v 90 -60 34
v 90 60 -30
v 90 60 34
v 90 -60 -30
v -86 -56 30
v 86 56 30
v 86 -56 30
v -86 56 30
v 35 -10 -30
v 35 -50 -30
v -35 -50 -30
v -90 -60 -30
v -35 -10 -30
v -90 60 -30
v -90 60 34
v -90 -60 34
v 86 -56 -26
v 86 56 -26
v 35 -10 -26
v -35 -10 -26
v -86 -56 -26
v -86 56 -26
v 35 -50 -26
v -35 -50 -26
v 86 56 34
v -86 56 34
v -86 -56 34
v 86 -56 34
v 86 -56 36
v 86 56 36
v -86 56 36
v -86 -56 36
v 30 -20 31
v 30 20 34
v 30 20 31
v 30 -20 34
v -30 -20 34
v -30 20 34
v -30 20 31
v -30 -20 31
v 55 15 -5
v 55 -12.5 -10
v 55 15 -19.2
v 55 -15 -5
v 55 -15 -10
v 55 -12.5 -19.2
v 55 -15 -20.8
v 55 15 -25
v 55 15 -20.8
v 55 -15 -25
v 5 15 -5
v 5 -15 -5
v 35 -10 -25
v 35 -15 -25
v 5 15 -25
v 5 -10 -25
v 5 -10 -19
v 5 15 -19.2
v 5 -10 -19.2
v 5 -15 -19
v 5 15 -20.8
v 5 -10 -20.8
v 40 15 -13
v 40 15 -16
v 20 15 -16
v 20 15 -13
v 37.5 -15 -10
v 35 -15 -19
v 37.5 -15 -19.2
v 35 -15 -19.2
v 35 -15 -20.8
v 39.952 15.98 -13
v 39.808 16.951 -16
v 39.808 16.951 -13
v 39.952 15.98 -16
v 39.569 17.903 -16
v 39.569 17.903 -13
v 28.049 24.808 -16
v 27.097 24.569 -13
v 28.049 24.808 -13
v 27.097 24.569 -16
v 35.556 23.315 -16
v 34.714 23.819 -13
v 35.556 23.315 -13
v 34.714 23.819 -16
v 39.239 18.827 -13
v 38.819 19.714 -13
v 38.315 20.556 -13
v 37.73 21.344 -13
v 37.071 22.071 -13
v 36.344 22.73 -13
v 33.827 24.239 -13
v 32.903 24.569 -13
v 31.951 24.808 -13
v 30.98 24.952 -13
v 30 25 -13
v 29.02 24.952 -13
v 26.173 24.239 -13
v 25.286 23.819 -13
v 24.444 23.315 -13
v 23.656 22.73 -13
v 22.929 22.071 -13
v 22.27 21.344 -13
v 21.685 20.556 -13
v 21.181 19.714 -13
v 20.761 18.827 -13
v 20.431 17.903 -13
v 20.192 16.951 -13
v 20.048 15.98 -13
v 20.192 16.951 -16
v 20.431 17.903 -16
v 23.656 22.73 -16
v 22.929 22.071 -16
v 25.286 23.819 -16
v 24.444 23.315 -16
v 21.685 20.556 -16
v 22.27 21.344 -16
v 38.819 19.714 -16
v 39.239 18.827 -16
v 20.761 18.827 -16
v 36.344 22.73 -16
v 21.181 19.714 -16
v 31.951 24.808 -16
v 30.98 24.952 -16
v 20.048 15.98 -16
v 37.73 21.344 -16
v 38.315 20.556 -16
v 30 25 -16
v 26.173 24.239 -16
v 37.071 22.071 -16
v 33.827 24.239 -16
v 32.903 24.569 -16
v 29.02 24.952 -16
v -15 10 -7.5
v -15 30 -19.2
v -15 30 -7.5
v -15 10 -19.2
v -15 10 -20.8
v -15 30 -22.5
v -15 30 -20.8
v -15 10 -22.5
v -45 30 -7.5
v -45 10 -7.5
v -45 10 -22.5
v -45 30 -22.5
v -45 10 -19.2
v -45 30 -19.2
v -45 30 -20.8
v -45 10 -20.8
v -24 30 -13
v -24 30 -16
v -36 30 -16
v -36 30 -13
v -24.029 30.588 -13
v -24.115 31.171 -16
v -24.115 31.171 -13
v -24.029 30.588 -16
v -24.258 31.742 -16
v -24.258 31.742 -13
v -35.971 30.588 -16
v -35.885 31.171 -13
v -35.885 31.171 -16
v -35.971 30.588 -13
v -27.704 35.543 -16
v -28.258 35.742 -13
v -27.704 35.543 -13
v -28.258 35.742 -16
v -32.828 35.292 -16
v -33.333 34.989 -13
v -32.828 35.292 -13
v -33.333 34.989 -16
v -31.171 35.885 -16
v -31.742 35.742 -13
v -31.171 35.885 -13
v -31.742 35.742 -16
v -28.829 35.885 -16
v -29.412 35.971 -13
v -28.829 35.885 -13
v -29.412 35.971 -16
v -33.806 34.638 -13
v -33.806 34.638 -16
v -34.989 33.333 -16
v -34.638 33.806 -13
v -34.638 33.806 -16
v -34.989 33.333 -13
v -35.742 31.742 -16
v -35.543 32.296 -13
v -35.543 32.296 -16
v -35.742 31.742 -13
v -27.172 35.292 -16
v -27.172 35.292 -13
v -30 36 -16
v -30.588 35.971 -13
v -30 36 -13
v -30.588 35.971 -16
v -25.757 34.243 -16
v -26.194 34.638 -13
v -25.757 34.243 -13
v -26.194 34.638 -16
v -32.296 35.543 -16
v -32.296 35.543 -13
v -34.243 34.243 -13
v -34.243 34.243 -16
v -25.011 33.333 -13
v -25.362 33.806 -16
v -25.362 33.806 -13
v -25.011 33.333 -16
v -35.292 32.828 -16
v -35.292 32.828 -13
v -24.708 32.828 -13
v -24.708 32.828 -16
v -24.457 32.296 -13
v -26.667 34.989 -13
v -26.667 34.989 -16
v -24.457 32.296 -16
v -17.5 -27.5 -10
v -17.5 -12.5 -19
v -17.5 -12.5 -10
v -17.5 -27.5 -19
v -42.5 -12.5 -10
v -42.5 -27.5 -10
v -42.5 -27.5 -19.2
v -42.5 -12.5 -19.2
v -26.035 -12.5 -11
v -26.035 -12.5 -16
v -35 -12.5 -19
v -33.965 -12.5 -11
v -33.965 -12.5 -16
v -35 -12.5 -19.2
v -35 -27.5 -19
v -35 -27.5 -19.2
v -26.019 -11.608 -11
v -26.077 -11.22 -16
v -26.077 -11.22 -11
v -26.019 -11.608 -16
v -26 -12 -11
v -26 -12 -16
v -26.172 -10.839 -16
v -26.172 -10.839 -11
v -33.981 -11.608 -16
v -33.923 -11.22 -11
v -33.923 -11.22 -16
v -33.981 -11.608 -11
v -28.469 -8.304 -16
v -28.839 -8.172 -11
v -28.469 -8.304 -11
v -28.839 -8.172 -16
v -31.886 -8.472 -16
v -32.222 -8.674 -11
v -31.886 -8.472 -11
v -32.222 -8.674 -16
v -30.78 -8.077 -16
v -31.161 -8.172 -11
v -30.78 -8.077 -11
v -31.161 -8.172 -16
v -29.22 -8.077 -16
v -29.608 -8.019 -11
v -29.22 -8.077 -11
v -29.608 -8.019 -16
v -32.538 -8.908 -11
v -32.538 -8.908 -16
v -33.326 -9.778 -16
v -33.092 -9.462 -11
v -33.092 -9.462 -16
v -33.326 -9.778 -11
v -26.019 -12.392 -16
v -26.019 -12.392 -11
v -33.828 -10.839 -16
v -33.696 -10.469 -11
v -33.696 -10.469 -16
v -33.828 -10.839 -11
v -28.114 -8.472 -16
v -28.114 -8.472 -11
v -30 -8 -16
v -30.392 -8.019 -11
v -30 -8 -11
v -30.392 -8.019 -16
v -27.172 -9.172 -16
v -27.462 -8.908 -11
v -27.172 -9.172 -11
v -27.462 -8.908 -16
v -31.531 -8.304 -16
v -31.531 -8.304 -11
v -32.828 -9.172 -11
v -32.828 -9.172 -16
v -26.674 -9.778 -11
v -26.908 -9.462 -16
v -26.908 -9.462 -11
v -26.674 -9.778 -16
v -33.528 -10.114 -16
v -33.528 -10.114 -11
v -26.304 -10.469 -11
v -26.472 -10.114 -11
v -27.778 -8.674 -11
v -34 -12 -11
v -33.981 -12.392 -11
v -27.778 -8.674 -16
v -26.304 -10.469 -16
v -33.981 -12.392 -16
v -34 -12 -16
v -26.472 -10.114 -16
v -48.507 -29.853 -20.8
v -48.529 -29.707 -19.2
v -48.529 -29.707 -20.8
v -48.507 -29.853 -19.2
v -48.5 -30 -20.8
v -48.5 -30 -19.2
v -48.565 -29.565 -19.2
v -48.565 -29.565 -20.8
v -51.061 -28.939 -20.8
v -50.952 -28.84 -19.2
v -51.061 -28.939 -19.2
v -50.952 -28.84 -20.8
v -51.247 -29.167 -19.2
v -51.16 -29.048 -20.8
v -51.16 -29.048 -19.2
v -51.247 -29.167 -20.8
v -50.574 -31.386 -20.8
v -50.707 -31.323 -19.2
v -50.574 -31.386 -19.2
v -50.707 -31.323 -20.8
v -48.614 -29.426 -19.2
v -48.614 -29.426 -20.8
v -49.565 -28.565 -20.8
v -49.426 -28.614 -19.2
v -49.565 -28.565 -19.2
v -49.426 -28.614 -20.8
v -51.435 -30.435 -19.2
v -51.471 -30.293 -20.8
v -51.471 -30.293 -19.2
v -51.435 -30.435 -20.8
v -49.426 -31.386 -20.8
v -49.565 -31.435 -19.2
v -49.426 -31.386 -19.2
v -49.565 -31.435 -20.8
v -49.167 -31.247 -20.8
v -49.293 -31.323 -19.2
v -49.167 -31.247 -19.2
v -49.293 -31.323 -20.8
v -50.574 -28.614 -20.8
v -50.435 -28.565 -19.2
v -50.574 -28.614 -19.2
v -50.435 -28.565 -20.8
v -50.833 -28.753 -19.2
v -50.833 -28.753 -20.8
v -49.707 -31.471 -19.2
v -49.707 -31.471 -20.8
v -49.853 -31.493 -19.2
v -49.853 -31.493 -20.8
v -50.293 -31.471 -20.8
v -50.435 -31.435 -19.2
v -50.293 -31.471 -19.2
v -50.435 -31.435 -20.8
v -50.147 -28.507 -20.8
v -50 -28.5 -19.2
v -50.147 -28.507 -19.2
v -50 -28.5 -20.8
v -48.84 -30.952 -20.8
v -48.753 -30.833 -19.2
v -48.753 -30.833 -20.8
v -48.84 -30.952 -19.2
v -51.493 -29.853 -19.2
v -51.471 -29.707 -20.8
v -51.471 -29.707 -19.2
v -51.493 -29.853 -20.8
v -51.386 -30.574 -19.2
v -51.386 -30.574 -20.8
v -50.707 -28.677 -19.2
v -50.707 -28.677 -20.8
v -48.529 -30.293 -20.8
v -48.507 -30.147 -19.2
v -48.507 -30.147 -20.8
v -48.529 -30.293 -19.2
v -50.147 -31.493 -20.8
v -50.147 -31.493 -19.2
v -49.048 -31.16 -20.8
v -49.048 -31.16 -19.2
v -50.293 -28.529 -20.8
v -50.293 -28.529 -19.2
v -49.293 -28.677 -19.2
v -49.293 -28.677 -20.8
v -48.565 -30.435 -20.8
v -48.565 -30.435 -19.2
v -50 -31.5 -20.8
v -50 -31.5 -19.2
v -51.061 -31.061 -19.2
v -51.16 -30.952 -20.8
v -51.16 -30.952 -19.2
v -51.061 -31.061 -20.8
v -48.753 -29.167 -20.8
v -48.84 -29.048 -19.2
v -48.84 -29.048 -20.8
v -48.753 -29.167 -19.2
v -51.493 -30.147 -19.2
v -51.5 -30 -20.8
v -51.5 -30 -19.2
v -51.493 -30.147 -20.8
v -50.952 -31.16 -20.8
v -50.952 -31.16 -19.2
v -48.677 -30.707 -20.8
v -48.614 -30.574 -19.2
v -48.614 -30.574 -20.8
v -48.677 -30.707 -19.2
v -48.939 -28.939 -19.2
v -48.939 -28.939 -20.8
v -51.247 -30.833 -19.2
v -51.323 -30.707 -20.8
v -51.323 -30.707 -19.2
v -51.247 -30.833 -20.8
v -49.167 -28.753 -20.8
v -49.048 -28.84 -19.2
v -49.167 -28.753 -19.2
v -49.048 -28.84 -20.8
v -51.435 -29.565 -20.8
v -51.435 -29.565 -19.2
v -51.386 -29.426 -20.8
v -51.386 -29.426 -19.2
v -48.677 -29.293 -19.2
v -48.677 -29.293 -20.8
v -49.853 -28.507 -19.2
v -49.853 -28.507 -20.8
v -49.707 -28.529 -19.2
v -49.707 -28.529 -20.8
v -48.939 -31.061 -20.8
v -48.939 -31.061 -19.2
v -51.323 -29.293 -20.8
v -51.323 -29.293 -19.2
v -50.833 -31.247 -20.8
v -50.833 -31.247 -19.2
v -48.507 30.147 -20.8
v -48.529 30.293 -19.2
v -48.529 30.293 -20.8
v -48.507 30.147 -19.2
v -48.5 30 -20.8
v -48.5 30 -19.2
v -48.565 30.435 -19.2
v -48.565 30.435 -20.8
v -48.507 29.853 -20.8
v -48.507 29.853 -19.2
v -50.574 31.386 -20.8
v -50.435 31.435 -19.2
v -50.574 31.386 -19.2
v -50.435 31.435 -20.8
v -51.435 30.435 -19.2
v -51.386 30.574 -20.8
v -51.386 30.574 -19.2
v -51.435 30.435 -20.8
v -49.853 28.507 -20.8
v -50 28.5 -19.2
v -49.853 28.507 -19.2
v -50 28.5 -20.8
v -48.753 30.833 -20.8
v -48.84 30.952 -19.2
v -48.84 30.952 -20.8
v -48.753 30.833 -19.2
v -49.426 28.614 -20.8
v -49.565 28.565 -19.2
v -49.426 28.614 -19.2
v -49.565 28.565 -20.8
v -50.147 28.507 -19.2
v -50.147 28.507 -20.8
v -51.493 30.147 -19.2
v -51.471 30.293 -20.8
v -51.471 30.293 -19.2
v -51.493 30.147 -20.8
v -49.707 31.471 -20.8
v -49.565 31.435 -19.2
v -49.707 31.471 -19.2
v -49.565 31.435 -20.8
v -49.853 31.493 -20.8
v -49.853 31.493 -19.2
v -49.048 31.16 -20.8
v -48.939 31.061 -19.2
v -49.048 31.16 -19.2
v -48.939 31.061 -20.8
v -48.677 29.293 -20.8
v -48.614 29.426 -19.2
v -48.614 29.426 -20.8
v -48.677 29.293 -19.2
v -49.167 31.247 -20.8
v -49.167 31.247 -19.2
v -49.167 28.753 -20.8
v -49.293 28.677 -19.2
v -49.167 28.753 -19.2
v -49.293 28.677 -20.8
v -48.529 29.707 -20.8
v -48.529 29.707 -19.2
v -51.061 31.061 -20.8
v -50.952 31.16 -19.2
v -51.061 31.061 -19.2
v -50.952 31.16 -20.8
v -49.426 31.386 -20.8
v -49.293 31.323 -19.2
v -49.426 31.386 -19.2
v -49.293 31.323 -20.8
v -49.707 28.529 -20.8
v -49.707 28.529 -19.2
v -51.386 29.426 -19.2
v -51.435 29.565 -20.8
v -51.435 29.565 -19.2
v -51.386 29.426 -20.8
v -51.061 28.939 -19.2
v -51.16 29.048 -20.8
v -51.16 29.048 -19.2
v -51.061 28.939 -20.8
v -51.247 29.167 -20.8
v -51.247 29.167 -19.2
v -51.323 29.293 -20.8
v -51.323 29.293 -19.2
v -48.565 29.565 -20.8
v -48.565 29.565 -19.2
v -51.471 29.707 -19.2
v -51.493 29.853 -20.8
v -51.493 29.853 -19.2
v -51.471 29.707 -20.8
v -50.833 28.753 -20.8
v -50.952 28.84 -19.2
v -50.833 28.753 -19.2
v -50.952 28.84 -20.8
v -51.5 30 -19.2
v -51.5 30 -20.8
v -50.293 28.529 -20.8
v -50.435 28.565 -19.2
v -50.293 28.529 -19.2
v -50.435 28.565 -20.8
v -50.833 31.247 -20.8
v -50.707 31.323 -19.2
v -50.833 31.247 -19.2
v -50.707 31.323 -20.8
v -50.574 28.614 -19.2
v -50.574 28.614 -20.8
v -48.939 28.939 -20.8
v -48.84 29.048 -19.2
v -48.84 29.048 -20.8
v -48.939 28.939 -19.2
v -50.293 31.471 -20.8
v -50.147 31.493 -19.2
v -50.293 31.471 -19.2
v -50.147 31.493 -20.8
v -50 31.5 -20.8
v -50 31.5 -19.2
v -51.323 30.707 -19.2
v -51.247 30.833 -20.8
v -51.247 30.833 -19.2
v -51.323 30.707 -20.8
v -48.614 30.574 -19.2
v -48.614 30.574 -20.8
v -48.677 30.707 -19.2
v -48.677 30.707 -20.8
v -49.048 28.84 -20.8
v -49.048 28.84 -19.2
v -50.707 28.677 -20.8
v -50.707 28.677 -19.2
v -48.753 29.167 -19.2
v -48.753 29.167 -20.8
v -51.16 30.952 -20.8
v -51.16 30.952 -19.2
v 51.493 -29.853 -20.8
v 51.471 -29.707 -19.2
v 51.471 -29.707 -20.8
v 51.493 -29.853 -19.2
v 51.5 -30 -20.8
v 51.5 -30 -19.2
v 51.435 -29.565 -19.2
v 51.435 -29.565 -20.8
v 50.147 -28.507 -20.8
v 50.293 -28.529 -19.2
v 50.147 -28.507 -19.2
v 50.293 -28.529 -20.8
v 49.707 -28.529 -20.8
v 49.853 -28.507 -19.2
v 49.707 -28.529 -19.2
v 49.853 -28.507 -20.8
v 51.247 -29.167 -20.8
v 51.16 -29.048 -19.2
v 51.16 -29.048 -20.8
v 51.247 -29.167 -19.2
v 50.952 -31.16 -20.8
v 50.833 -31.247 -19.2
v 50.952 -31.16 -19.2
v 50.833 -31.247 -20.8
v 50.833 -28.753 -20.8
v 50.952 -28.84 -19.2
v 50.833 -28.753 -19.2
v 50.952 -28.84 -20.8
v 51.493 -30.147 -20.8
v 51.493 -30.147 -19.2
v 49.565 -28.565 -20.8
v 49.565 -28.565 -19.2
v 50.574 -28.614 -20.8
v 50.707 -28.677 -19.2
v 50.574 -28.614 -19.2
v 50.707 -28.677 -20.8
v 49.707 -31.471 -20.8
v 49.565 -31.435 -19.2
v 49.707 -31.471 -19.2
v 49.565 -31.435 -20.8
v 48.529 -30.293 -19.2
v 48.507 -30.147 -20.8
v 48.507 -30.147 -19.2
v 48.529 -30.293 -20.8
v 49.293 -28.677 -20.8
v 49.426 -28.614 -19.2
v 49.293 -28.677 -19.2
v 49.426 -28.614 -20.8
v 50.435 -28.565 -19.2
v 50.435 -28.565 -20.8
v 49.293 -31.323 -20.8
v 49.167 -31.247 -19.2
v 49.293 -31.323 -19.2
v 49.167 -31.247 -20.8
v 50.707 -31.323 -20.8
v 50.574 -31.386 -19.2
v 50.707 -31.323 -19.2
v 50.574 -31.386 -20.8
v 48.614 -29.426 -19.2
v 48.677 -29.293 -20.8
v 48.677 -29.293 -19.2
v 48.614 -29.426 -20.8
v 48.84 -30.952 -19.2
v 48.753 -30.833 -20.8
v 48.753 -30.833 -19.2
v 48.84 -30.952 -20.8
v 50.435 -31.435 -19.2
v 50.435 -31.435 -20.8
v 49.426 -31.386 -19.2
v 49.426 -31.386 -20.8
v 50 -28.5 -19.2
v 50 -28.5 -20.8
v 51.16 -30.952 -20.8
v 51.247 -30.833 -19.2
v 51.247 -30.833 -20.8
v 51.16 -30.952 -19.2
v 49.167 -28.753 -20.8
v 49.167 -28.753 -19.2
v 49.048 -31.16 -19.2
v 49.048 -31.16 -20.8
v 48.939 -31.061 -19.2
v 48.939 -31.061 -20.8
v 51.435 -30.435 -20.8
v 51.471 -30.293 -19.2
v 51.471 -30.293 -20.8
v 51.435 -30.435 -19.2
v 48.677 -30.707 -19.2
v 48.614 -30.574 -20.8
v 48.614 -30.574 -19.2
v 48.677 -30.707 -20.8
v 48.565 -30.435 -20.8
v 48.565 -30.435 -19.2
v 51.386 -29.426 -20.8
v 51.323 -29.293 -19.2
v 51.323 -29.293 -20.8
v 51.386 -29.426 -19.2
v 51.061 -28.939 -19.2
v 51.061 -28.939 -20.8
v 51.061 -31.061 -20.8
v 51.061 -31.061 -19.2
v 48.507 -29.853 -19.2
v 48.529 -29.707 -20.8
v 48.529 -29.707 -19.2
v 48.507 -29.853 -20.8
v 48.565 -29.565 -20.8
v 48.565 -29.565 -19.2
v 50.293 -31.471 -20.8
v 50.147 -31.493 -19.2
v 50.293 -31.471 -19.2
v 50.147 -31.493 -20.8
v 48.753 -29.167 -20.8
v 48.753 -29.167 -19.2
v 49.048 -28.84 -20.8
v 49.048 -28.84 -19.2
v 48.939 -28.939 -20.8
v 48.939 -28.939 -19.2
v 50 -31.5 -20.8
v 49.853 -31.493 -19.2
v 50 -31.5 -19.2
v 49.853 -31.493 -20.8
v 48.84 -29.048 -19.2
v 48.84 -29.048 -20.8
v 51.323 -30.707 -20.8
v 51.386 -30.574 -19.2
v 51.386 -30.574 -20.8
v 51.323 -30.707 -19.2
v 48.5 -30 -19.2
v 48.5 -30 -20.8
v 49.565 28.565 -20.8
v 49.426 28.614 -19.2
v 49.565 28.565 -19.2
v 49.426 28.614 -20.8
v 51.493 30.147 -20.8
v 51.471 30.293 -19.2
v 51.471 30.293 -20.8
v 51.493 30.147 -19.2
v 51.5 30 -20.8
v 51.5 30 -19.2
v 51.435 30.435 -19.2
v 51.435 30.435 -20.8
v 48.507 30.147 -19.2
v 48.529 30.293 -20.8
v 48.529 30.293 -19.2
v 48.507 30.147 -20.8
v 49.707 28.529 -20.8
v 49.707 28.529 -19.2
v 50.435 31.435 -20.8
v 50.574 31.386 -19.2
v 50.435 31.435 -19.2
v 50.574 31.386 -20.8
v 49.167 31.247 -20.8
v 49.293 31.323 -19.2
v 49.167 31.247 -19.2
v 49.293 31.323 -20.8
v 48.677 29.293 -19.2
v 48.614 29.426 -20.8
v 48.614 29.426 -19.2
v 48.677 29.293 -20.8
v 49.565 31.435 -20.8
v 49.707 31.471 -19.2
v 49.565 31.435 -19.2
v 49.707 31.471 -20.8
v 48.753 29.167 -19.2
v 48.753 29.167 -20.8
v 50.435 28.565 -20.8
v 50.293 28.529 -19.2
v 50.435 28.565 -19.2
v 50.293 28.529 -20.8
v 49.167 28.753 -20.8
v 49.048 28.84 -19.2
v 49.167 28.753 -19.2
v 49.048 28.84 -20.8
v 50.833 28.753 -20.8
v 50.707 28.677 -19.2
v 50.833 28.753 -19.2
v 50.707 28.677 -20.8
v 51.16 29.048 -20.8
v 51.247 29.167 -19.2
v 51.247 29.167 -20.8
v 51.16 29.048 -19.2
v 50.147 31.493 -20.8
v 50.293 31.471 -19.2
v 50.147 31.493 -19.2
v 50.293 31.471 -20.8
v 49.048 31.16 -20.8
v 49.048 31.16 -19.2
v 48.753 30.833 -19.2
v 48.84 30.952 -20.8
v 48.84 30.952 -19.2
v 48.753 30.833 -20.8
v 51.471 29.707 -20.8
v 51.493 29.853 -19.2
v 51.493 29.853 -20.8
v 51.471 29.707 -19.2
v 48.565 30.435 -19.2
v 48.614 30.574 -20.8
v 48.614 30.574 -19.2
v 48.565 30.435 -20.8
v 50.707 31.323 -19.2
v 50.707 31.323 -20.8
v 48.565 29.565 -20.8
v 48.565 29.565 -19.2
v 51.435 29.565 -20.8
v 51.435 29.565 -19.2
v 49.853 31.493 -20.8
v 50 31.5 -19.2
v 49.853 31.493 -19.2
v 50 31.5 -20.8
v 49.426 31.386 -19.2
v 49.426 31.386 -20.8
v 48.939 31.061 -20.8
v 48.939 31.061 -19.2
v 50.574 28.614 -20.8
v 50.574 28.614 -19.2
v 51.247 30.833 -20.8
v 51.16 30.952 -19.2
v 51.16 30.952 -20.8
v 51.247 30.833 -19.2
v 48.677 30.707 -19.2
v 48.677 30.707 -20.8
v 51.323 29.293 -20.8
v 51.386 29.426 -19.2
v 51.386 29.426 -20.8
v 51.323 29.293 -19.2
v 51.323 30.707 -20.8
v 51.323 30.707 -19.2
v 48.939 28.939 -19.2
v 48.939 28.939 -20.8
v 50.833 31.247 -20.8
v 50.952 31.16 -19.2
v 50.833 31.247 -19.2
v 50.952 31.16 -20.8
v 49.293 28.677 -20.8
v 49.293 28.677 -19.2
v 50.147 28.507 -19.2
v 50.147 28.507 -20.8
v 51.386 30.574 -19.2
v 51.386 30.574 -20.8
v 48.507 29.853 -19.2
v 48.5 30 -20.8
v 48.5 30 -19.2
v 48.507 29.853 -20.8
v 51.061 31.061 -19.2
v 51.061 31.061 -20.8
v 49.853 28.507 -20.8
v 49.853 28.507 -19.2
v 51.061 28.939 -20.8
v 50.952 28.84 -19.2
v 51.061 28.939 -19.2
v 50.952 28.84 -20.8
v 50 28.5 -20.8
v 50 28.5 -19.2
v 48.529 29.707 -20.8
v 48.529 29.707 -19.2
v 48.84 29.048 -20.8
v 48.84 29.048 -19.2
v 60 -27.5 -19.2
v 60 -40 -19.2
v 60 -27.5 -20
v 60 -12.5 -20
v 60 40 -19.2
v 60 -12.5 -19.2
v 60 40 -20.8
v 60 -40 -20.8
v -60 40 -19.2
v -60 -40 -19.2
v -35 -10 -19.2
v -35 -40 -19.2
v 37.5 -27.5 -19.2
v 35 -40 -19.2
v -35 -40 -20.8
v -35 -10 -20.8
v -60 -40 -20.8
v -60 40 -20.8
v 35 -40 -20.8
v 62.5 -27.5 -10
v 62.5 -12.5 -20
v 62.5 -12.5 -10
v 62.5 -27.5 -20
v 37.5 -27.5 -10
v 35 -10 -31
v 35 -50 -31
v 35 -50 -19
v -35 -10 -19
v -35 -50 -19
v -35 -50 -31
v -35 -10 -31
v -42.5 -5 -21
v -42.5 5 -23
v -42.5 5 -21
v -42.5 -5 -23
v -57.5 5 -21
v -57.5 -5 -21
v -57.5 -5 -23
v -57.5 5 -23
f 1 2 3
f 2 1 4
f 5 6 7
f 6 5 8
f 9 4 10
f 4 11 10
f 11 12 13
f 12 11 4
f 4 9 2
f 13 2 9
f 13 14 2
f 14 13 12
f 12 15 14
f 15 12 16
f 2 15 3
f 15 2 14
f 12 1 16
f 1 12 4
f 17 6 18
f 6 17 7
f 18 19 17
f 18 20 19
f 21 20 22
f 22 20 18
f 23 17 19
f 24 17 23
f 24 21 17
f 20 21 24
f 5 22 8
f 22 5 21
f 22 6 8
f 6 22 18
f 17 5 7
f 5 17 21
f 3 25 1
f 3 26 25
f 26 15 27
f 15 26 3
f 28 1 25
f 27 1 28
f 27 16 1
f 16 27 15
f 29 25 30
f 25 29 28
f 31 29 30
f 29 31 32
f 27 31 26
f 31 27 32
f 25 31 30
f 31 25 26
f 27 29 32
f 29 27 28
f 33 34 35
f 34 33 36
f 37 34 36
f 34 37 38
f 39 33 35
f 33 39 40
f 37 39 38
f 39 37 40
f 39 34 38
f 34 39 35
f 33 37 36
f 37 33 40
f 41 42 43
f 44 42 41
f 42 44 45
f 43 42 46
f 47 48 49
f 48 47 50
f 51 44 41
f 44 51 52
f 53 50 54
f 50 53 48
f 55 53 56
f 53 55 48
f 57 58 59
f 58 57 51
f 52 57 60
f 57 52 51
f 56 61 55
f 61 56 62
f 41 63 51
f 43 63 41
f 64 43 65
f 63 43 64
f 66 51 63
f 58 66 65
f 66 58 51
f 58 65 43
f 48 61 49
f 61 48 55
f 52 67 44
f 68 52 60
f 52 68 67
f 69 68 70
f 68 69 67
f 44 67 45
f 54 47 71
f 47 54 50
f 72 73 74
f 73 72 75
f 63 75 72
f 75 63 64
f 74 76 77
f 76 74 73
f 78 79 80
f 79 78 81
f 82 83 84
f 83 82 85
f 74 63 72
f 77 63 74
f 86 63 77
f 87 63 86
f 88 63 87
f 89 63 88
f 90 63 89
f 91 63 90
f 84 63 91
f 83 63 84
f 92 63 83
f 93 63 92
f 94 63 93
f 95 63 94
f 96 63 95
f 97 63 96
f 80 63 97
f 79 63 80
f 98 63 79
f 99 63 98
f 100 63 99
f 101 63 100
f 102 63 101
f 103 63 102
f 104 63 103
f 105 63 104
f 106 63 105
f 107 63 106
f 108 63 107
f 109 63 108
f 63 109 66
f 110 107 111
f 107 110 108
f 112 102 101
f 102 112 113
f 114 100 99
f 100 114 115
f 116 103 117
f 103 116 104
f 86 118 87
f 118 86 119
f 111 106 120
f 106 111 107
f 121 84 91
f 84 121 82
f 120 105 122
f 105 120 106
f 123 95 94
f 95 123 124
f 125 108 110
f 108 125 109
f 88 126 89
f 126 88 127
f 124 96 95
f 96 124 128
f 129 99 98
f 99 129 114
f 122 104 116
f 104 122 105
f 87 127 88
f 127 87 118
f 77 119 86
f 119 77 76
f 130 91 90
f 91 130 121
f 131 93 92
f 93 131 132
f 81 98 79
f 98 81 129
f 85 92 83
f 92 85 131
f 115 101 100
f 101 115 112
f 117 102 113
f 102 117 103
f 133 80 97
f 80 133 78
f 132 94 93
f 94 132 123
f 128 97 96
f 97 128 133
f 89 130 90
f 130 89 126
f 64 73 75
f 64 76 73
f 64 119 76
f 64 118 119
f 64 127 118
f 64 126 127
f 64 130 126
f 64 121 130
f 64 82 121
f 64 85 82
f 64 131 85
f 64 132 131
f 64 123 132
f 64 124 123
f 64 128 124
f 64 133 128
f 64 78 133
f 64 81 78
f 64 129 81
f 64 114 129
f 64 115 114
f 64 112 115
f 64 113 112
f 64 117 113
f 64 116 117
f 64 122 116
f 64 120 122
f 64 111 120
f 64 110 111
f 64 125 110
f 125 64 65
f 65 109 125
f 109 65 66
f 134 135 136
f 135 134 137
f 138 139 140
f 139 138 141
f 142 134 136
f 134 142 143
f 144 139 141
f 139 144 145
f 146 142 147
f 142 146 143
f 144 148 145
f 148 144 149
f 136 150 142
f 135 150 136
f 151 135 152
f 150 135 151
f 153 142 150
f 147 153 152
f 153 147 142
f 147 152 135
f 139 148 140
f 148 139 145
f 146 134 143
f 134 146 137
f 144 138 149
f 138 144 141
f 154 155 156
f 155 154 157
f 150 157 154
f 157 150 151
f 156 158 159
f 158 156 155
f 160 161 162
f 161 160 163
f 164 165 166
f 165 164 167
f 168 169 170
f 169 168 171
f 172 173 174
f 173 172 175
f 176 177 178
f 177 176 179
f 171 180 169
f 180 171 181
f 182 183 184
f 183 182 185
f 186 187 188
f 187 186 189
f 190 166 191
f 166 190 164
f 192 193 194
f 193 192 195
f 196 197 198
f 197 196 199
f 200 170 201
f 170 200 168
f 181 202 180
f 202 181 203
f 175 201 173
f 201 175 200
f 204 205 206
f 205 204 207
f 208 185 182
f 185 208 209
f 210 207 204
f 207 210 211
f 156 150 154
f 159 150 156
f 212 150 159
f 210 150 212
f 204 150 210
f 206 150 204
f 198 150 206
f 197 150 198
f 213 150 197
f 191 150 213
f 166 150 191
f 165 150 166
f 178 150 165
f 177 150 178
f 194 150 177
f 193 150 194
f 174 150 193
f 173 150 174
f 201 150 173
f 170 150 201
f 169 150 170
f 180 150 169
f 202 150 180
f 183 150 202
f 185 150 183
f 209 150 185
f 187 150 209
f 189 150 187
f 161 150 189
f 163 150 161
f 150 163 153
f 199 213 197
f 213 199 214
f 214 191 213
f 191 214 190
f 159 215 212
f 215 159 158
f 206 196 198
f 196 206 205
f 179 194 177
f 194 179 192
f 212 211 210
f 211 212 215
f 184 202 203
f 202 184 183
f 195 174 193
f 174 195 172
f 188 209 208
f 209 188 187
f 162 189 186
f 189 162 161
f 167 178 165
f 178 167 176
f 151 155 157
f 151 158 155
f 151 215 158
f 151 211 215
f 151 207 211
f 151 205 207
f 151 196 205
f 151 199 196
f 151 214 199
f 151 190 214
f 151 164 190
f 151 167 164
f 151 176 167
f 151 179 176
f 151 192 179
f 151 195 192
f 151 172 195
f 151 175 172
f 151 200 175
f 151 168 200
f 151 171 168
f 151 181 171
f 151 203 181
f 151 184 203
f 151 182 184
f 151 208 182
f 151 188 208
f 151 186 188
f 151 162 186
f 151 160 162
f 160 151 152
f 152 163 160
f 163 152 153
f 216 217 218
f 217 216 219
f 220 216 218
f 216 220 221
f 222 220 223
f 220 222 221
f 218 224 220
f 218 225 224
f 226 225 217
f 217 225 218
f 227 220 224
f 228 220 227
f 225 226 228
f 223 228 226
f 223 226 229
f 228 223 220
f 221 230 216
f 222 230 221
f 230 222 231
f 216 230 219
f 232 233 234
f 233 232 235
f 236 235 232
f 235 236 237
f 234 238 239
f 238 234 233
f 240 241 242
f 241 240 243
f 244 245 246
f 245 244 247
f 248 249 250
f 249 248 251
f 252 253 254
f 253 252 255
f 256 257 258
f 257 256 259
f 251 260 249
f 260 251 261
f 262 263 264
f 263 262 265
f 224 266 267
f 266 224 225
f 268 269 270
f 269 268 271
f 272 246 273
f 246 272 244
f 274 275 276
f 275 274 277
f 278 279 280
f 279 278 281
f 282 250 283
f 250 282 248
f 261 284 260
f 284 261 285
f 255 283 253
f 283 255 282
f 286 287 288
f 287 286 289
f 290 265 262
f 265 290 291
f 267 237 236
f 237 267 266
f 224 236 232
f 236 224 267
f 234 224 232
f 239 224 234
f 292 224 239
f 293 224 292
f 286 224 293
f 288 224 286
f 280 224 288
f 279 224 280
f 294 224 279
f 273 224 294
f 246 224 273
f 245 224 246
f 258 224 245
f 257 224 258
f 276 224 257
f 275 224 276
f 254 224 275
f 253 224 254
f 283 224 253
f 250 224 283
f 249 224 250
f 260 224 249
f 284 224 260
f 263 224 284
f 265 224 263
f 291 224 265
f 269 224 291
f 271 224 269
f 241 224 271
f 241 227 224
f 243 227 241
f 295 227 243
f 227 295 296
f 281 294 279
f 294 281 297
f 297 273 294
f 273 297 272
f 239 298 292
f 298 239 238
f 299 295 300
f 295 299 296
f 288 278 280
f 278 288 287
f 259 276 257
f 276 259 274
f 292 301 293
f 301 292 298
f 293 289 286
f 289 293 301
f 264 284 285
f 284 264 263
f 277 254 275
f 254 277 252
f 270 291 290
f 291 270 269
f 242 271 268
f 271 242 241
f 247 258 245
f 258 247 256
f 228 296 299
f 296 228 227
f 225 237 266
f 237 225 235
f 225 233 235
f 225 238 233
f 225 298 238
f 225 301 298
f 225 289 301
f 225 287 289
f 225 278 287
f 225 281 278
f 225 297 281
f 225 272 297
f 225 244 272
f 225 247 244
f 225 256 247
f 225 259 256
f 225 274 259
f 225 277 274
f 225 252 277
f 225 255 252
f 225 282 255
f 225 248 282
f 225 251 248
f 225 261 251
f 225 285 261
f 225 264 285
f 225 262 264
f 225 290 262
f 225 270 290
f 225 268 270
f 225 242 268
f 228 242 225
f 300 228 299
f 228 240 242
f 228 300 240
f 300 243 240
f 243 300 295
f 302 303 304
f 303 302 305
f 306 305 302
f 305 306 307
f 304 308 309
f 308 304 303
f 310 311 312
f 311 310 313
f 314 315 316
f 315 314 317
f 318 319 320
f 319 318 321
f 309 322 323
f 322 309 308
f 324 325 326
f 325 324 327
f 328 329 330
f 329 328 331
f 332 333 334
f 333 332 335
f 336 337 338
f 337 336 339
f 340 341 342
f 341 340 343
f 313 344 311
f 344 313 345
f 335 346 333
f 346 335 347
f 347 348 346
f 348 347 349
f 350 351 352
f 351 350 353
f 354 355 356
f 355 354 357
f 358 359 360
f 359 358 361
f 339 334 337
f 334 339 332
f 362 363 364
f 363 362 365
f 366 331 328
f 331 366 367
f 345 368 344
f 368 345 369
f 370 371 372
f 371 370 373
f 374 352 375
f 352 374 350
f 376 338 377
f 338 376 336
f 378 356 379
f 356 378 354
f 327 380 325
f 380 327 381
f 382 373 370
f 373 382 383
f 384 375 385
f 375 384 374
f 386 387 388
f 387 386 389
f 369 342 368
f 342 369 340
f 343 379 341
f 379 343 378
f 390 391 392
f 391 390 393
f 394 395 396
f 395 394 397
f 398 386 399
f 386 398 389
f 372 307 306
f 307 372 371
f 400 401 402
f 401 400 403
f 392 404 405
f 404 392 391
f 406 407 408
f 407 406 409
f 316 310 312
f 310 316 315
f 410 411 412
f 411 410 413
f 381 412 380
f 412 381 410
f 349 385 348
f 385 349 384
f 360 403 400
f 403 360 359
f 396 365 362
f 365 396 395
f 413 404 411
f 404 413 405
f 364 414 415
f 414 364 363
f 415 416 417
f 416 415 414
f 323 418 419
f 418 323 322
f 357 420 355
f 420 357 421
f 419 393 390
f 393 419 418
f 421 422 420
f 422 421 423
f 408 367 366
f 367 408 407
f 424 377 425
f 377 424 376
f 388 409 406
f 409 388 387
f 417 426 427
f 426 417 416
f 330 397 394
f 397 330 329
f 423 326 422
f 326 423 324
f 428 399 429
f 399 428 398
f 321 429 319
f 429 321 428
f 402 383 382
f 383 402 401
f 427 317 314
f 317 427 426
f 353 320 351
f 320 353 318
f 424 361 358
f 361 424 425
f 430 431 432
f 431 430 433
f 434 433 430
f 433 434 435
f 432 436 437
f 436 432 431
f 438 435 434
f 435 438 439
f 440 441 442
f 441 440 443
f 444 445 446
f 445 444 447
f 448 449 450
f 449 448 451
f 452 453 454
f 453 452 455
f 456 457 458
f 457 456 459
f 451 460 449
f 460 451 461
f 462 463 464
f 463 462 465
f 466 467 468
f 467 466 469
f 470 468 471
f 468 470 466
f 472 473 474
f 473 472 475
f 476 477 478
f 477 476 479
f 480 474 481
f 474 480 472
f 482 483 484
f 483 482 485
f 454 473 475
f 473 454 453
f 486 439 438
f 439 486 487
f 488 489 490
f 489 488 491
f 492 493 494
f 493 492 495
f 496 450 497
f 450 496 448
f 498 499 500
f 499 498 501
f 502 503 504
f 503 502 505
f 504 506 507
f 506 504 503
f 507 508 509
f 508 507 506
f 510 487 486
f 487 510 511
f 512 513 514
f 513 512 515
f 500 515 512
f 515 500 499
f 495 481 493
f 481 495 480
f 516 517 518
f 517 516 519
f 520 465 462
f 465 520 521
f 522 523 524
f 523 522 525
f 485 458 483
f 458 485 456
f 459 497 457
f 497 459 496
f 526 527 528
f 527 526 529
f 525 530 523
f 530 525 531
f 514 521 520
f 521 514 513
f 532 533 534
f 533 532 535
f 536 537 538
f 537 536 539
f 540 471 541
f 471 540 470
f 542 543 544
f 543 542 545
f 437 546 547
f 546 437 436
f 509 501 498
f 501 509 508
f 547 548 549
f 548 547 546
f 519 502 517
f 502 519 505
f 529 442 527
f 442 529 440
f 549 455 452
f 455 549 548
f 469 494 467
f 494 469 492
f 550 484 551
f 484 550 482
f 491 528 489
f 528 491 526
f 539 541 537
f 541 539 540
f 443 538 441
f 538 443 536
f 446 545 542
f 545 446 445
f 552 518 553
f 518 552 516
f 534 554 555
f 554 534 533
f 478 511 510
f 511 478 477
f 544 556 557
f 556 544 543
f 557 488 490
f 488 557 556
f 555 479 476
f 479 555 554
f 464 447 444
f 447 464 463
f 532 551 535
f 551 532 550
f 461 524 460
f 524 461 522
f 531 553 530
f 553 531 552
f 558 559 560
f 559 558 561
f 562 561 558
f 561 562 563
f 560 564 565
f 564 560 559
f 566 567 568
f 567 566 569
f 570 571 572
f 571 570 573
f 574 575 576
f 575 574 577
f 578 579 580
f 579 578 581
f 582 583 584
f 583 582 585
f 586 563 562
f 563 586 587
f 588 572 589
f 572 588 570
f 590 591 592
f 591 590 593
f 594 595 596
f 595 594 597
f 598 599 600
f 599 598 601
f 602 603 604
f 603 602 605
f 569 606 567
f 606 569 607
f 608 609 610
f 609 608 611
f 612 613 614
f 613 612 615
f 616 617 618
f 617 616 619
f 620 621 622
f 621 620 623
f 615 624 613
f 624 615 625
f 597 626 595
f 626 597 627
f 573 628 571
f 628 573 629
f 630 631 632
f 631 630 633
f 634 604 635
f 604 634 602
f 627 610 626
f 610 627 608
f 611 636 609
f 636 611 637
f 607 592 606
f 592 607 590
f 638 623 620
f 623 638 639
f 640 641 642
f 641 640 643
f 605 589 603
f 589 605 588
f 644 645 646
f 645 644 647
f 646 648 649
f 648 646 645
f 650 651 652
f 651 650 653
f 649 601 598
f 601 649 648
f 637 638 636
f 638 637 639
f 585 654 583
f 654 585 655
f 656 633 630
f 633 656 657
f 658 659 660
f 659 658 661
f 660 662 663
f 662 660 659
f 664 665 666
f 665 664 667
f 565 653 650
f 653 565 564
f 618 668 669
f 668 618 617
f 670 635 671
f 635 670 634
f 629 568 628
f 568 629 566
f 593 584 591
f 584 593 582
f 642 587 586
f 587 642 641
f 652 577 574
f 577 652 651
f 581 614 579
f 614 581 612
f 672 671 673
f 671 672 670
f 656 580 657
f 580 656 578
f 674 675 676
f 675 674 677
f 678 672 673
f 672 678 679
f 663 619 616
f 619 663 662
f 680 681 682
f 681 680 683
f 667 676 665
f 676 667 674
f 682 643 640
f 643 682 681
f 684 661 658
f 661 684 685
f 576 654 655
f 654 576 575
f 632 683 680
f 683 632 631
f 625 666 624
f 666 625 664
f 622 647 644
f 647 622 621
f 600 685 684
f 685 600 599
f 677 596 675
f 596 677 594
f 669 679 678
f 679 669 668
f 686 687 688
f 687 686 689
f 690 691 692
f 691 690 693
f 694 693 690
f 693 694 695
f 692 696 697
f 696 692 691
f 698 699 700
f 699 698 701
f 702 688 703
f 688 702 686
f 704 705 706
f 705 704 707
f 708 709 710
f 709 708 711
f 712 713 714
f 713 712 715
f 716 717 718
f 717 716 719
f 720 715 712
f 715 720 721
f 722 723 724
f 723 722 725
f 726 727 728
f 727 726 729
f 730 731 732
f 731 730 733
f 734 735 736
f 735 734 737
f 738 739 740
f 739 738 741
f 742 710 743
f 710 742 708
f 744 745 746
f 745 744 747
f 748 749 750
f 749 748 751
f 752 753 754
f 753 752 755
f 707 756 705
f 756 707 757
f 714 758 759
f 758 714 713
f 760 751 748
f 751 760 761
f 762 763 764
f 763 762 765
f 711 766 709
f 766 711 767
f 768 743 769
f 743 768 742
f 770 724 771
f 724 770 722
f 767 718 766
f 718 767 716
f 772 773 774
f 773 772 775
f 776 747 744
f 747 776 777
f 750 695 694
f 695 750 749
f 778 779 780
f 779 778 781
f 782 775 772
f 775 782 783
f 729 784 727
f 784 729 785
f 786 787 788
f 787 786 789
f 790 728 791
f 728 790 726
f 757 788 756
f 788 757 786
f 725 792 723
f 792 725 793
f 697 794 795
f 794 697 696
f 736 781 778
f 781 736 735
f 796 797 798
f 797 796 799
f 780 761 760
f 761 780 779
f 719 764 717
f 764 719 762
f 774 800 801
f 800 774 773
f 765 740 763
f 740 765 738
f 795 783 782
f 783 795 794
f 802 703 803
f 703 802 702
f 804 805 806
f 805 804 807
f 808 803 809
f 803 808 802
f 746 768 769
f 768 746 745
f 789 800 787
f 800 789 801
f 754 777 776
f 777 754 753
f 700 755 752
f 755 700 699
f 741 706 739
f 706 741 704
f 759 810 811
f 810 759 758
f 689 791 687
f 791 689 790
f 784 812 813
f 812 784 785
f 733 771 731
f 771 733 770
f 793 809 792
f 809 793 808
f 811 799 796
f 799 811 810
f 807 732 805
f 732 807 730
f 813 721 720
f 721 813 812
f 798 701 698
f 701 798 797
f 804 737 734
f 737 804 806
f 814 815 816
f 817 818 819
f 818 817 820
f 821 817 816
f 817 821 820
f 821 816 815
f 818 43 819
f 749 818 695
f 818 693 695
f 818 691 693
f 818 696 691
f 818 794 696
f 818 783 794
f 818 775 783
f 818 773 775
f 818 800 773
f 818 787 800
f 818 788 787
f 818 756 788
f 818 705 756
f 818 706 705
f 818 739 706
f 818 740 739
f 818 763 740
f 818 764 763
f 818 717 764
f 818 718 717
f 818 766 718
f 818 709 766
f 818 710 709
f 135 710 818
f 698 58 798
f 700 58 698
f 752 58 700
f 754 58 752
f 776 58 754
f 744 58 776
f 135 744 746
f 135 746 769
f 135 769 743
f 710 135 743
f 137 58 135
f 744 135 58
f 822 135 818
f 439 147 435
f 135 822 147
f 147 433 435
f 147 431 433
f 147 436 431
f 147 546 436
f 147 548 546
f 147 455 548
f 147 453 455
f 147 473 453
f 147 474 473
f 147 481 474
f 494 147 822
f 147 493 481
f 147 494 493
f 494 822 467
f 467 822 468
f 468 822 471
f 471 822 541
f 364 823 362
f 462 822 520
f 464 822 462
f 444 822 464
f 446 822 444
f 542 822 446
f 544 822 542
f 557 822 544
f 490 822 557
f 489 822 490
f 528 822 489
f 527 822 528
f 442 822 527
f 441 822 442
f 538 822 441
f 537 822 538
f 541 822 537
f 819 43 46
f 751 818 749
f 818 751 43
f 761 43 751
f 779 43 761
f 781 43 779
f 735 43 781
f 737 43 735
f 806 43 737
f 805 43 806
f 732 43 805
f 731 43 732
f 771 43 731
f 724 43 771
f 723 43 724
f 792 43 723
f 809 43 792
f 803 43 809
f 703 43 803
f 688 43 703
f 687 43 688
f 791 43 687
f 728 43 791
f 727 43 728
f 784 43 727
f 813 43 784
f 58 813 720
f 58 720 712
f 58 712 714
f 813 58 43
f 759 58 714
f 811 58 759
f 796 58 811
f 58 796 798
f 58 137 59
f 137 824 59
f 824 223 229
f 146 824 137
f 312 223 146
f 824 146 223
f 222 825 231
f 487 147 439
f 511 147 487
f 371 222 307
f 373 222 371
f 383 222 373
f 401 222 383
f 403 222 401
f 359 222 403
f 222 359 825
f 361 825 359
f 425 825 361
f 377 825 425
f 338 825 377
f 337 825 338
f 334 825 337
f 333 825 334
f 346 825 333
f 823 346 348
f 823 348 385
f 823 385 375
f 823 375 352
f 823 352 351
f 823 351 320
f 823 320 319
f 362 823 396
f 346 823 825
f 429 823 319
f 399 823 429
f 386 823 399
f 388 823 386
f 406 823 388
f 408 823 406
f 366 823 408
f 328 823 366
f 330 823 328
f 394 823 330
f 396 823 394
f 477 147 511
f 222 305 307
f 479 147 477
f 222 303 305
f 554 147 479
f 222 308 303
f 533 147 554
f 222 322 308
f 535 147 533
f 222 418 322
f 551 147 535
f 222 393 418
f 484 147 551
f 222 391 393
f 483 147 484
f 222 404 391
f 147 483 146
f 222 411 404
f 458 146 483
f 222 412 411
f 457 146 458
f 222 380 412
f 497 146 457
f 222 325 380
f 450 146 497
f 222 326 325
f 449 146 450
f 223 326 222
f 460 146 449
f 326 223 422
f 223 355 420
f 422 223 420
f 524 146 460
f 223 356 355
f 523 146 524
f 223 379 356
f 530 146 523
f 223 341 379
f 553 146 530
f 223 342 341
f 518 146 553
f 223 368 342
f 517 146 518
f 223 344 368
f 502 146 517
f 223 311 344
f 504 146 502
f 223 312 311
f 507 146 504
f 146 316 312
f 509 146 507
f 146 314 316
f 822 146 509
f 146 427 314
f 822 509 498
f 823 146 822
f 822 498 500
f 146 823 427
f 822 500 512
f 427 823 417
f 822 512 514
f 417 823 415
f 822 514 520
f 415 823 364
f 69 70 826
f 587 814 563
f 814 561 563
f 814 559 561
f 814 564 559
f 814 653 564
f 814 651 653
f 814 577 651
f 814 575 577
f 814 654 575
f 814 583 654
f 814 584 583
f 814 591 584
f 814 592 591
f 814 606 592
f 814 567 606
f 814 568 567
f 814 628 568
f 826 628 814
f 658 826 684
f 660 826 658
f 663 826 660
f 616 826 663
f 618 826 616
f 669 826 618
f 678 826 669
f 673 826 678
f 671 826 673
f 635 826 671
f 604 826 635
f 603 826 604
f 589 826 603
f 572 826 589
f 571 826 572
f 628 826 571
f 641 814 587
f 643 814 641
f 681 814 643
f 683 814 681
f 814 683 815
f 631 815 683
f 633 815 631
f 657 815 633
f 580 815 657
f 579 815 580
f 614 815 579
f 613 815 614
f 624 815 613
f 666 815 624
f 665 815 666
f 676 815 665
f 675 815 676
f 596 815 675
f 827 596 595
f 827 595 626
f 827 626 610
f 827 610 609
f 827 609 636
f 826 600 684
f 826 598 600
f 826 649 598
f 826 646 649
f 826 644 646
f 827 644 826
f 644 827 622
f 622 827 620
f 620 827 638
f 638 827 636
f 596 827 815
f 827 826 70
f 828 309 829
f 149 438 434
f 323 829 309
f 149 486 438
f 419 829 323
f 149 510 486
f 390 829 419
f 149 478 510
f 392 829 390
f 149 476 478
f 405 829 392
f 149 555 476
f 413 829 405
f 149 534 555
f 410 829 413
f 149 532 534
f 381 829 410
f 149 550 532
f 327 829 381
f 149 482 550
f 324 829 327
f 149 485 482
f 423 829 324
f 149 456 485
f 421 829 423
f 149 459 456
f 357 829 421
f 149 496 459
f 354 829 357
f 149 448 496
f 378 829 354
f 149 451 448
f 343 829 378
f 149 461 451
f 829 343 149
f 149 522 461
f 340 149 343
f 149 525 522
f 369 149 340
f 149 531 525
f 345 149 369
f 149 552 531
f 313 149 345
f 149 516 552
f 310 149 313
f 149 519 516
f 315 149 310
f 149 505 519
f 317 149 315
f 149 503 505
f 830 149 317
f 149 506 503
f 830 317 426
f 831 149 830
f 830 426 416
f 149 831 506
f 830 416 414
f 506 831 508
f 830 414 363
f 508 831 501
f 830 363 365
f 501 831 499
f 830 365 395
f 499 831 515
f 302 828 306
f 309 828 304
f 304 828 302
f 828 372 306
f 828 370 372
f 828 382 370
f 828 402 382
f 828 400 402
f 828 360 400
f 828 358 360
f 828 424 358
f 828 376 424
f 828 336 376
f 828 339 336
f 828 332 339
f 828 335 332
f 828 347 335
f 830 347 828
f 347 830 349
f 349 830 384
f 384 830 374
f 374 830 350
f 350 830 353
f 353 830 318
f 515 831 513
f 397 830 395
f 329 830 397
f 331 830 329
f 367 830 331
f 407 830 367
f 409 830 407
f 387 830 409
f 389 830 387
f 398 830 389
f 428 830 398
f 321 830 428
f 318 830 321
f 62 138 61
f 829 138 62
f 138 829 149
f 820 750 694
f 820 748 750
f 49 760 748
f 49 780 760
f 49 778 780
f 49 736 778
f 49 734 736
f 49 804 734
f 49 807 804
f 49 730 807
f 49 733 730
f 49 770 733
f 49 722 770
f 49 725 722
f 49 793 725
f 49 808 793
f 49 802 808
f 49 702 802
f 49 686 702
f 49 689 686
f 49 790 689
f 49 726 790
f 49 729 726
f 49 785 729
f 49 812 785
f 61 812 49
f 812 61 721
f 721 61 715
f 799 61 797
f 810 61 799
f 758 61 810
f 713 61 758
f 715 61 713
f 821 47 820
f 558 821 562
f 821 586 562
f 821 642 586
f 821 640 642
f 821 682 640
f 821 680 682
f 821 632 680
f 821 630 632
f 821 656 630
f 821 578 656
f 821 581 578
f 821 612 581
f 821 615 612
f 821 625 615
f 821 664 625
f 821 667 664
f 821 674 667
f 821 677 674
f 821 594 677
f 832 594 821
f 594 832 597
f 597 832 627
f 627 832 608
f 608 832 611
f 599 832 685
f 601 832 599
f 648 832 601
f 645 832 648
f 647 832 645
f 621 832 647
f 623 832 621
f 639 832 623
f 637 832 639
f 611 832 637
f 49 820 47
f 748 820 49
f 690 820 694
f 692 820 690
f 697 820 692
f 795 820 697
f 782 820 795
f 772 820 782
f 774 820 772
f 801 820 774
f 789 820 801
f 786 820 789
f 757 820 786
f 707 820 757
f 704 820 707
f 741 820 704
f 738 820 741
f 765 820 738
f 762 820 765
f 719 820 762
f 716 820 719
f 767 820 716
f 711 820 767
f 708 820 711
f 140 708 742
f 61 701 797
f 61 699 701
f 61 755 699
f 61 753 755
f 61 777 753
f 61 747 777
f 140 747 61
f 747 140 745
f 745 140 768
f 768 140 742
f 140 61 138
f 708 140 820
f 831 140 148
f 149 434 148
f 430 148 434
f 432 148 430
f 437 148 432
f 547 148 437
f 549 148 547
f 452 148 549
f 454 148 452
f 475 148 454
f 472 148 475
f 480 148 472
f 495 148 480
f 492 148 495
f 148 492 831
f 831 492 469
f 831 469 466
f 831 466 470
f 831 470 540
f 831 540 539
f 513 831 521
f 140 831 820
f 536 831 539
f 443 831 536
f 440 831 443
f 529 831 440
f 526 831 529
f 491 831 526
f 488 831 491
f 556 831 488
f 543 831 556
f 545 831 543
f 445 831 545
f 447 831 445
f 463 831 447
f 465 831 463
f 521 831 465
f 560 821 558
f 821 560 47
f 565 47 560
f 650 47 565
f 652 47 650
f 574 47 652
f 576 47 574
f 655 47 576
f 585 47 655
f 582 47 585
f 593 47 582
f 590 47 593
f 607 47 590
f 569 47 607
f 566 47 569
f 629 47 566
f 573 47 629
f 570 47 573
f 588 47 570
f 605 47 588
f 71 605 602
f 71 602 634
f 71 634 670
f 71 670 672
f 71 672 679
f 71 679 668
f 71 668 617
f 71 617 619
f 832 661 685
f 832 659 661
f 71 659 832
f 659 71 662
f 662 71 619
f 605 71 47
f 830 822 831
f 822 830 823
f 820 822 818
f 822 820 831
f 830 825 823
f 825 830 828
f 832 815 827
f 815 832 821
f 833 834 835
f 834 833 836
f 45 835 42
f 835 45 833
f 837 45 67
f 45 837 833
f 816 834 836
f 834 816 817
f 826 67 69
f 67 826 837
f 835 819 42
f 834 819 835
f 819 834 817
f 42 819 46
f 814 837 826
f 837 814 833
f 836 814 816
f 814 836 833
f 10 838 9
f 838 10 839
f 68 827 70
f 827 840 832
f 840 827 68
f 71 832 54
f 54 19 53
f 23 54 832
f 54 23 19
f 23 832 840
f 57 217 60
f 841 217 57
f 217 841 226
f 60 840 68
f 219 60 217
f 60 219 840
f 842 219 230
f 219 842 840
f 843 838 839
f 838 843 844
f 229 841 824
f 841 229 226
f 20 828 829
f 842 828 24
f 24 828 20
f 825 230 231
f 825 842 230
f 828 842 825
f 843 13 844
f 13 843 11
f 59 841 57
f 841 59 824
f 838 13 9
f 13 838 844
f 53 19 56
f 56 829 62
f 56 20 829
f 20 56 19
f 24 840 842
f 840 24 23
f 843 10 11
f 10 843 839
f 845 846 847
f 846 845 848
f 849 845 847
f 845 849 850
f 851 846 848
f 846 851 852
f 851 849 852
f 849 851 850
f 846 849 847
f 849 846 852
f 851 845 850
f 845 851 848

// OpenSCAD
// СпектрАгро-П — Портативный мультиспектральный анализатор
// Корпус 180×120×60 мм

$fn = 64;

module nir_window() {
    translate([0, 0, -1])
        cylinder(d=20, h=3);
}

module uv_window() {
    translate([0, 0, -1])
        cylinder(d=12, h=3);
}

module ph_connector() {
    translate([0, 0, -1])
        cylinder(d=8, h=5);
}

module display_cutout() {
    translate([-30, -20, -1])
        cube([60, 40, 3]);
}

module button_hole() {
    cylinder(d=6, h=5);
}

module main_body() {
    difference() {
        cube([180, 120, 60], center=true);
        translate([0, 0, 2])
            cube([172, 112, 56], center=true);
    }
}

module lid() {
    difference() {
        union() {
            cube([180, 120, 4], center=true);
            translate([0, 0, 2])
                cube([172, 112, 4], center=true);
        }
        display_cutout();
    }
}

module nir_module() {
    color([0.2, 0.2, 0.8])
    union() {
        cube([50, 30, 20], center=true);
        translate([0, 15, 0])
            nir_window();
    }
}

module uv_module() {
    color([0.8, 0.2, 0.2])
    union() {
        cube([30, 20, 15], center=true);
        translate([0, 10, 0])
            uv_window();
    }
}

module ph_module() {
    color([0.2, 0.8, 0.2])
    union() {
        cube([25, 15, 10], center=true);
        translate([0, 8, 0])
            ph_connector();
    }
}

module cond_module() {
    color([0.8, 0.8, 0.2])
    cube([25, 15, 10], center=true);
}

module pcb() {
    color([0.1, 0.5, 0.1])
    difference() {
        cube([120, 80, 1.6], center=true);
        for (x = [-50, 50])
            for (y = [-30, 30])
                translate([x, y, 0])
                    cylinder(d=3, h=3, center=true);
    }
}

module stm32_chip() {
    color([0.2, 0.2, 0.2])
    cube([14, 14, 1.5], center=true);
}

module battery() {
    color([0.3, 0.3, 0.8])
    cube([70, 40, 12], center=true);
}

module ble_module() {
    color([0.5, 0.5, 0.5])
    cube([15, 10, 2], center=true);
}

module assembly() {
    main_body();
    translate([0, 0, 32]) lid();
    translate([30, 0, -15]) nir_module();
    translate([-30, 20, -15]) uv_module();
    translate([-30, -20, -15]) ph_module();
    translate([50, -20, -15]) cond_module();
    translate([0, 0, -20]) pcb();
    translate([30, 0, -22]) stm32_chip();
    translate([0, -30, -25]) battery();
    translate([-50, 0, -22]) ble_module();
}

assembly();
